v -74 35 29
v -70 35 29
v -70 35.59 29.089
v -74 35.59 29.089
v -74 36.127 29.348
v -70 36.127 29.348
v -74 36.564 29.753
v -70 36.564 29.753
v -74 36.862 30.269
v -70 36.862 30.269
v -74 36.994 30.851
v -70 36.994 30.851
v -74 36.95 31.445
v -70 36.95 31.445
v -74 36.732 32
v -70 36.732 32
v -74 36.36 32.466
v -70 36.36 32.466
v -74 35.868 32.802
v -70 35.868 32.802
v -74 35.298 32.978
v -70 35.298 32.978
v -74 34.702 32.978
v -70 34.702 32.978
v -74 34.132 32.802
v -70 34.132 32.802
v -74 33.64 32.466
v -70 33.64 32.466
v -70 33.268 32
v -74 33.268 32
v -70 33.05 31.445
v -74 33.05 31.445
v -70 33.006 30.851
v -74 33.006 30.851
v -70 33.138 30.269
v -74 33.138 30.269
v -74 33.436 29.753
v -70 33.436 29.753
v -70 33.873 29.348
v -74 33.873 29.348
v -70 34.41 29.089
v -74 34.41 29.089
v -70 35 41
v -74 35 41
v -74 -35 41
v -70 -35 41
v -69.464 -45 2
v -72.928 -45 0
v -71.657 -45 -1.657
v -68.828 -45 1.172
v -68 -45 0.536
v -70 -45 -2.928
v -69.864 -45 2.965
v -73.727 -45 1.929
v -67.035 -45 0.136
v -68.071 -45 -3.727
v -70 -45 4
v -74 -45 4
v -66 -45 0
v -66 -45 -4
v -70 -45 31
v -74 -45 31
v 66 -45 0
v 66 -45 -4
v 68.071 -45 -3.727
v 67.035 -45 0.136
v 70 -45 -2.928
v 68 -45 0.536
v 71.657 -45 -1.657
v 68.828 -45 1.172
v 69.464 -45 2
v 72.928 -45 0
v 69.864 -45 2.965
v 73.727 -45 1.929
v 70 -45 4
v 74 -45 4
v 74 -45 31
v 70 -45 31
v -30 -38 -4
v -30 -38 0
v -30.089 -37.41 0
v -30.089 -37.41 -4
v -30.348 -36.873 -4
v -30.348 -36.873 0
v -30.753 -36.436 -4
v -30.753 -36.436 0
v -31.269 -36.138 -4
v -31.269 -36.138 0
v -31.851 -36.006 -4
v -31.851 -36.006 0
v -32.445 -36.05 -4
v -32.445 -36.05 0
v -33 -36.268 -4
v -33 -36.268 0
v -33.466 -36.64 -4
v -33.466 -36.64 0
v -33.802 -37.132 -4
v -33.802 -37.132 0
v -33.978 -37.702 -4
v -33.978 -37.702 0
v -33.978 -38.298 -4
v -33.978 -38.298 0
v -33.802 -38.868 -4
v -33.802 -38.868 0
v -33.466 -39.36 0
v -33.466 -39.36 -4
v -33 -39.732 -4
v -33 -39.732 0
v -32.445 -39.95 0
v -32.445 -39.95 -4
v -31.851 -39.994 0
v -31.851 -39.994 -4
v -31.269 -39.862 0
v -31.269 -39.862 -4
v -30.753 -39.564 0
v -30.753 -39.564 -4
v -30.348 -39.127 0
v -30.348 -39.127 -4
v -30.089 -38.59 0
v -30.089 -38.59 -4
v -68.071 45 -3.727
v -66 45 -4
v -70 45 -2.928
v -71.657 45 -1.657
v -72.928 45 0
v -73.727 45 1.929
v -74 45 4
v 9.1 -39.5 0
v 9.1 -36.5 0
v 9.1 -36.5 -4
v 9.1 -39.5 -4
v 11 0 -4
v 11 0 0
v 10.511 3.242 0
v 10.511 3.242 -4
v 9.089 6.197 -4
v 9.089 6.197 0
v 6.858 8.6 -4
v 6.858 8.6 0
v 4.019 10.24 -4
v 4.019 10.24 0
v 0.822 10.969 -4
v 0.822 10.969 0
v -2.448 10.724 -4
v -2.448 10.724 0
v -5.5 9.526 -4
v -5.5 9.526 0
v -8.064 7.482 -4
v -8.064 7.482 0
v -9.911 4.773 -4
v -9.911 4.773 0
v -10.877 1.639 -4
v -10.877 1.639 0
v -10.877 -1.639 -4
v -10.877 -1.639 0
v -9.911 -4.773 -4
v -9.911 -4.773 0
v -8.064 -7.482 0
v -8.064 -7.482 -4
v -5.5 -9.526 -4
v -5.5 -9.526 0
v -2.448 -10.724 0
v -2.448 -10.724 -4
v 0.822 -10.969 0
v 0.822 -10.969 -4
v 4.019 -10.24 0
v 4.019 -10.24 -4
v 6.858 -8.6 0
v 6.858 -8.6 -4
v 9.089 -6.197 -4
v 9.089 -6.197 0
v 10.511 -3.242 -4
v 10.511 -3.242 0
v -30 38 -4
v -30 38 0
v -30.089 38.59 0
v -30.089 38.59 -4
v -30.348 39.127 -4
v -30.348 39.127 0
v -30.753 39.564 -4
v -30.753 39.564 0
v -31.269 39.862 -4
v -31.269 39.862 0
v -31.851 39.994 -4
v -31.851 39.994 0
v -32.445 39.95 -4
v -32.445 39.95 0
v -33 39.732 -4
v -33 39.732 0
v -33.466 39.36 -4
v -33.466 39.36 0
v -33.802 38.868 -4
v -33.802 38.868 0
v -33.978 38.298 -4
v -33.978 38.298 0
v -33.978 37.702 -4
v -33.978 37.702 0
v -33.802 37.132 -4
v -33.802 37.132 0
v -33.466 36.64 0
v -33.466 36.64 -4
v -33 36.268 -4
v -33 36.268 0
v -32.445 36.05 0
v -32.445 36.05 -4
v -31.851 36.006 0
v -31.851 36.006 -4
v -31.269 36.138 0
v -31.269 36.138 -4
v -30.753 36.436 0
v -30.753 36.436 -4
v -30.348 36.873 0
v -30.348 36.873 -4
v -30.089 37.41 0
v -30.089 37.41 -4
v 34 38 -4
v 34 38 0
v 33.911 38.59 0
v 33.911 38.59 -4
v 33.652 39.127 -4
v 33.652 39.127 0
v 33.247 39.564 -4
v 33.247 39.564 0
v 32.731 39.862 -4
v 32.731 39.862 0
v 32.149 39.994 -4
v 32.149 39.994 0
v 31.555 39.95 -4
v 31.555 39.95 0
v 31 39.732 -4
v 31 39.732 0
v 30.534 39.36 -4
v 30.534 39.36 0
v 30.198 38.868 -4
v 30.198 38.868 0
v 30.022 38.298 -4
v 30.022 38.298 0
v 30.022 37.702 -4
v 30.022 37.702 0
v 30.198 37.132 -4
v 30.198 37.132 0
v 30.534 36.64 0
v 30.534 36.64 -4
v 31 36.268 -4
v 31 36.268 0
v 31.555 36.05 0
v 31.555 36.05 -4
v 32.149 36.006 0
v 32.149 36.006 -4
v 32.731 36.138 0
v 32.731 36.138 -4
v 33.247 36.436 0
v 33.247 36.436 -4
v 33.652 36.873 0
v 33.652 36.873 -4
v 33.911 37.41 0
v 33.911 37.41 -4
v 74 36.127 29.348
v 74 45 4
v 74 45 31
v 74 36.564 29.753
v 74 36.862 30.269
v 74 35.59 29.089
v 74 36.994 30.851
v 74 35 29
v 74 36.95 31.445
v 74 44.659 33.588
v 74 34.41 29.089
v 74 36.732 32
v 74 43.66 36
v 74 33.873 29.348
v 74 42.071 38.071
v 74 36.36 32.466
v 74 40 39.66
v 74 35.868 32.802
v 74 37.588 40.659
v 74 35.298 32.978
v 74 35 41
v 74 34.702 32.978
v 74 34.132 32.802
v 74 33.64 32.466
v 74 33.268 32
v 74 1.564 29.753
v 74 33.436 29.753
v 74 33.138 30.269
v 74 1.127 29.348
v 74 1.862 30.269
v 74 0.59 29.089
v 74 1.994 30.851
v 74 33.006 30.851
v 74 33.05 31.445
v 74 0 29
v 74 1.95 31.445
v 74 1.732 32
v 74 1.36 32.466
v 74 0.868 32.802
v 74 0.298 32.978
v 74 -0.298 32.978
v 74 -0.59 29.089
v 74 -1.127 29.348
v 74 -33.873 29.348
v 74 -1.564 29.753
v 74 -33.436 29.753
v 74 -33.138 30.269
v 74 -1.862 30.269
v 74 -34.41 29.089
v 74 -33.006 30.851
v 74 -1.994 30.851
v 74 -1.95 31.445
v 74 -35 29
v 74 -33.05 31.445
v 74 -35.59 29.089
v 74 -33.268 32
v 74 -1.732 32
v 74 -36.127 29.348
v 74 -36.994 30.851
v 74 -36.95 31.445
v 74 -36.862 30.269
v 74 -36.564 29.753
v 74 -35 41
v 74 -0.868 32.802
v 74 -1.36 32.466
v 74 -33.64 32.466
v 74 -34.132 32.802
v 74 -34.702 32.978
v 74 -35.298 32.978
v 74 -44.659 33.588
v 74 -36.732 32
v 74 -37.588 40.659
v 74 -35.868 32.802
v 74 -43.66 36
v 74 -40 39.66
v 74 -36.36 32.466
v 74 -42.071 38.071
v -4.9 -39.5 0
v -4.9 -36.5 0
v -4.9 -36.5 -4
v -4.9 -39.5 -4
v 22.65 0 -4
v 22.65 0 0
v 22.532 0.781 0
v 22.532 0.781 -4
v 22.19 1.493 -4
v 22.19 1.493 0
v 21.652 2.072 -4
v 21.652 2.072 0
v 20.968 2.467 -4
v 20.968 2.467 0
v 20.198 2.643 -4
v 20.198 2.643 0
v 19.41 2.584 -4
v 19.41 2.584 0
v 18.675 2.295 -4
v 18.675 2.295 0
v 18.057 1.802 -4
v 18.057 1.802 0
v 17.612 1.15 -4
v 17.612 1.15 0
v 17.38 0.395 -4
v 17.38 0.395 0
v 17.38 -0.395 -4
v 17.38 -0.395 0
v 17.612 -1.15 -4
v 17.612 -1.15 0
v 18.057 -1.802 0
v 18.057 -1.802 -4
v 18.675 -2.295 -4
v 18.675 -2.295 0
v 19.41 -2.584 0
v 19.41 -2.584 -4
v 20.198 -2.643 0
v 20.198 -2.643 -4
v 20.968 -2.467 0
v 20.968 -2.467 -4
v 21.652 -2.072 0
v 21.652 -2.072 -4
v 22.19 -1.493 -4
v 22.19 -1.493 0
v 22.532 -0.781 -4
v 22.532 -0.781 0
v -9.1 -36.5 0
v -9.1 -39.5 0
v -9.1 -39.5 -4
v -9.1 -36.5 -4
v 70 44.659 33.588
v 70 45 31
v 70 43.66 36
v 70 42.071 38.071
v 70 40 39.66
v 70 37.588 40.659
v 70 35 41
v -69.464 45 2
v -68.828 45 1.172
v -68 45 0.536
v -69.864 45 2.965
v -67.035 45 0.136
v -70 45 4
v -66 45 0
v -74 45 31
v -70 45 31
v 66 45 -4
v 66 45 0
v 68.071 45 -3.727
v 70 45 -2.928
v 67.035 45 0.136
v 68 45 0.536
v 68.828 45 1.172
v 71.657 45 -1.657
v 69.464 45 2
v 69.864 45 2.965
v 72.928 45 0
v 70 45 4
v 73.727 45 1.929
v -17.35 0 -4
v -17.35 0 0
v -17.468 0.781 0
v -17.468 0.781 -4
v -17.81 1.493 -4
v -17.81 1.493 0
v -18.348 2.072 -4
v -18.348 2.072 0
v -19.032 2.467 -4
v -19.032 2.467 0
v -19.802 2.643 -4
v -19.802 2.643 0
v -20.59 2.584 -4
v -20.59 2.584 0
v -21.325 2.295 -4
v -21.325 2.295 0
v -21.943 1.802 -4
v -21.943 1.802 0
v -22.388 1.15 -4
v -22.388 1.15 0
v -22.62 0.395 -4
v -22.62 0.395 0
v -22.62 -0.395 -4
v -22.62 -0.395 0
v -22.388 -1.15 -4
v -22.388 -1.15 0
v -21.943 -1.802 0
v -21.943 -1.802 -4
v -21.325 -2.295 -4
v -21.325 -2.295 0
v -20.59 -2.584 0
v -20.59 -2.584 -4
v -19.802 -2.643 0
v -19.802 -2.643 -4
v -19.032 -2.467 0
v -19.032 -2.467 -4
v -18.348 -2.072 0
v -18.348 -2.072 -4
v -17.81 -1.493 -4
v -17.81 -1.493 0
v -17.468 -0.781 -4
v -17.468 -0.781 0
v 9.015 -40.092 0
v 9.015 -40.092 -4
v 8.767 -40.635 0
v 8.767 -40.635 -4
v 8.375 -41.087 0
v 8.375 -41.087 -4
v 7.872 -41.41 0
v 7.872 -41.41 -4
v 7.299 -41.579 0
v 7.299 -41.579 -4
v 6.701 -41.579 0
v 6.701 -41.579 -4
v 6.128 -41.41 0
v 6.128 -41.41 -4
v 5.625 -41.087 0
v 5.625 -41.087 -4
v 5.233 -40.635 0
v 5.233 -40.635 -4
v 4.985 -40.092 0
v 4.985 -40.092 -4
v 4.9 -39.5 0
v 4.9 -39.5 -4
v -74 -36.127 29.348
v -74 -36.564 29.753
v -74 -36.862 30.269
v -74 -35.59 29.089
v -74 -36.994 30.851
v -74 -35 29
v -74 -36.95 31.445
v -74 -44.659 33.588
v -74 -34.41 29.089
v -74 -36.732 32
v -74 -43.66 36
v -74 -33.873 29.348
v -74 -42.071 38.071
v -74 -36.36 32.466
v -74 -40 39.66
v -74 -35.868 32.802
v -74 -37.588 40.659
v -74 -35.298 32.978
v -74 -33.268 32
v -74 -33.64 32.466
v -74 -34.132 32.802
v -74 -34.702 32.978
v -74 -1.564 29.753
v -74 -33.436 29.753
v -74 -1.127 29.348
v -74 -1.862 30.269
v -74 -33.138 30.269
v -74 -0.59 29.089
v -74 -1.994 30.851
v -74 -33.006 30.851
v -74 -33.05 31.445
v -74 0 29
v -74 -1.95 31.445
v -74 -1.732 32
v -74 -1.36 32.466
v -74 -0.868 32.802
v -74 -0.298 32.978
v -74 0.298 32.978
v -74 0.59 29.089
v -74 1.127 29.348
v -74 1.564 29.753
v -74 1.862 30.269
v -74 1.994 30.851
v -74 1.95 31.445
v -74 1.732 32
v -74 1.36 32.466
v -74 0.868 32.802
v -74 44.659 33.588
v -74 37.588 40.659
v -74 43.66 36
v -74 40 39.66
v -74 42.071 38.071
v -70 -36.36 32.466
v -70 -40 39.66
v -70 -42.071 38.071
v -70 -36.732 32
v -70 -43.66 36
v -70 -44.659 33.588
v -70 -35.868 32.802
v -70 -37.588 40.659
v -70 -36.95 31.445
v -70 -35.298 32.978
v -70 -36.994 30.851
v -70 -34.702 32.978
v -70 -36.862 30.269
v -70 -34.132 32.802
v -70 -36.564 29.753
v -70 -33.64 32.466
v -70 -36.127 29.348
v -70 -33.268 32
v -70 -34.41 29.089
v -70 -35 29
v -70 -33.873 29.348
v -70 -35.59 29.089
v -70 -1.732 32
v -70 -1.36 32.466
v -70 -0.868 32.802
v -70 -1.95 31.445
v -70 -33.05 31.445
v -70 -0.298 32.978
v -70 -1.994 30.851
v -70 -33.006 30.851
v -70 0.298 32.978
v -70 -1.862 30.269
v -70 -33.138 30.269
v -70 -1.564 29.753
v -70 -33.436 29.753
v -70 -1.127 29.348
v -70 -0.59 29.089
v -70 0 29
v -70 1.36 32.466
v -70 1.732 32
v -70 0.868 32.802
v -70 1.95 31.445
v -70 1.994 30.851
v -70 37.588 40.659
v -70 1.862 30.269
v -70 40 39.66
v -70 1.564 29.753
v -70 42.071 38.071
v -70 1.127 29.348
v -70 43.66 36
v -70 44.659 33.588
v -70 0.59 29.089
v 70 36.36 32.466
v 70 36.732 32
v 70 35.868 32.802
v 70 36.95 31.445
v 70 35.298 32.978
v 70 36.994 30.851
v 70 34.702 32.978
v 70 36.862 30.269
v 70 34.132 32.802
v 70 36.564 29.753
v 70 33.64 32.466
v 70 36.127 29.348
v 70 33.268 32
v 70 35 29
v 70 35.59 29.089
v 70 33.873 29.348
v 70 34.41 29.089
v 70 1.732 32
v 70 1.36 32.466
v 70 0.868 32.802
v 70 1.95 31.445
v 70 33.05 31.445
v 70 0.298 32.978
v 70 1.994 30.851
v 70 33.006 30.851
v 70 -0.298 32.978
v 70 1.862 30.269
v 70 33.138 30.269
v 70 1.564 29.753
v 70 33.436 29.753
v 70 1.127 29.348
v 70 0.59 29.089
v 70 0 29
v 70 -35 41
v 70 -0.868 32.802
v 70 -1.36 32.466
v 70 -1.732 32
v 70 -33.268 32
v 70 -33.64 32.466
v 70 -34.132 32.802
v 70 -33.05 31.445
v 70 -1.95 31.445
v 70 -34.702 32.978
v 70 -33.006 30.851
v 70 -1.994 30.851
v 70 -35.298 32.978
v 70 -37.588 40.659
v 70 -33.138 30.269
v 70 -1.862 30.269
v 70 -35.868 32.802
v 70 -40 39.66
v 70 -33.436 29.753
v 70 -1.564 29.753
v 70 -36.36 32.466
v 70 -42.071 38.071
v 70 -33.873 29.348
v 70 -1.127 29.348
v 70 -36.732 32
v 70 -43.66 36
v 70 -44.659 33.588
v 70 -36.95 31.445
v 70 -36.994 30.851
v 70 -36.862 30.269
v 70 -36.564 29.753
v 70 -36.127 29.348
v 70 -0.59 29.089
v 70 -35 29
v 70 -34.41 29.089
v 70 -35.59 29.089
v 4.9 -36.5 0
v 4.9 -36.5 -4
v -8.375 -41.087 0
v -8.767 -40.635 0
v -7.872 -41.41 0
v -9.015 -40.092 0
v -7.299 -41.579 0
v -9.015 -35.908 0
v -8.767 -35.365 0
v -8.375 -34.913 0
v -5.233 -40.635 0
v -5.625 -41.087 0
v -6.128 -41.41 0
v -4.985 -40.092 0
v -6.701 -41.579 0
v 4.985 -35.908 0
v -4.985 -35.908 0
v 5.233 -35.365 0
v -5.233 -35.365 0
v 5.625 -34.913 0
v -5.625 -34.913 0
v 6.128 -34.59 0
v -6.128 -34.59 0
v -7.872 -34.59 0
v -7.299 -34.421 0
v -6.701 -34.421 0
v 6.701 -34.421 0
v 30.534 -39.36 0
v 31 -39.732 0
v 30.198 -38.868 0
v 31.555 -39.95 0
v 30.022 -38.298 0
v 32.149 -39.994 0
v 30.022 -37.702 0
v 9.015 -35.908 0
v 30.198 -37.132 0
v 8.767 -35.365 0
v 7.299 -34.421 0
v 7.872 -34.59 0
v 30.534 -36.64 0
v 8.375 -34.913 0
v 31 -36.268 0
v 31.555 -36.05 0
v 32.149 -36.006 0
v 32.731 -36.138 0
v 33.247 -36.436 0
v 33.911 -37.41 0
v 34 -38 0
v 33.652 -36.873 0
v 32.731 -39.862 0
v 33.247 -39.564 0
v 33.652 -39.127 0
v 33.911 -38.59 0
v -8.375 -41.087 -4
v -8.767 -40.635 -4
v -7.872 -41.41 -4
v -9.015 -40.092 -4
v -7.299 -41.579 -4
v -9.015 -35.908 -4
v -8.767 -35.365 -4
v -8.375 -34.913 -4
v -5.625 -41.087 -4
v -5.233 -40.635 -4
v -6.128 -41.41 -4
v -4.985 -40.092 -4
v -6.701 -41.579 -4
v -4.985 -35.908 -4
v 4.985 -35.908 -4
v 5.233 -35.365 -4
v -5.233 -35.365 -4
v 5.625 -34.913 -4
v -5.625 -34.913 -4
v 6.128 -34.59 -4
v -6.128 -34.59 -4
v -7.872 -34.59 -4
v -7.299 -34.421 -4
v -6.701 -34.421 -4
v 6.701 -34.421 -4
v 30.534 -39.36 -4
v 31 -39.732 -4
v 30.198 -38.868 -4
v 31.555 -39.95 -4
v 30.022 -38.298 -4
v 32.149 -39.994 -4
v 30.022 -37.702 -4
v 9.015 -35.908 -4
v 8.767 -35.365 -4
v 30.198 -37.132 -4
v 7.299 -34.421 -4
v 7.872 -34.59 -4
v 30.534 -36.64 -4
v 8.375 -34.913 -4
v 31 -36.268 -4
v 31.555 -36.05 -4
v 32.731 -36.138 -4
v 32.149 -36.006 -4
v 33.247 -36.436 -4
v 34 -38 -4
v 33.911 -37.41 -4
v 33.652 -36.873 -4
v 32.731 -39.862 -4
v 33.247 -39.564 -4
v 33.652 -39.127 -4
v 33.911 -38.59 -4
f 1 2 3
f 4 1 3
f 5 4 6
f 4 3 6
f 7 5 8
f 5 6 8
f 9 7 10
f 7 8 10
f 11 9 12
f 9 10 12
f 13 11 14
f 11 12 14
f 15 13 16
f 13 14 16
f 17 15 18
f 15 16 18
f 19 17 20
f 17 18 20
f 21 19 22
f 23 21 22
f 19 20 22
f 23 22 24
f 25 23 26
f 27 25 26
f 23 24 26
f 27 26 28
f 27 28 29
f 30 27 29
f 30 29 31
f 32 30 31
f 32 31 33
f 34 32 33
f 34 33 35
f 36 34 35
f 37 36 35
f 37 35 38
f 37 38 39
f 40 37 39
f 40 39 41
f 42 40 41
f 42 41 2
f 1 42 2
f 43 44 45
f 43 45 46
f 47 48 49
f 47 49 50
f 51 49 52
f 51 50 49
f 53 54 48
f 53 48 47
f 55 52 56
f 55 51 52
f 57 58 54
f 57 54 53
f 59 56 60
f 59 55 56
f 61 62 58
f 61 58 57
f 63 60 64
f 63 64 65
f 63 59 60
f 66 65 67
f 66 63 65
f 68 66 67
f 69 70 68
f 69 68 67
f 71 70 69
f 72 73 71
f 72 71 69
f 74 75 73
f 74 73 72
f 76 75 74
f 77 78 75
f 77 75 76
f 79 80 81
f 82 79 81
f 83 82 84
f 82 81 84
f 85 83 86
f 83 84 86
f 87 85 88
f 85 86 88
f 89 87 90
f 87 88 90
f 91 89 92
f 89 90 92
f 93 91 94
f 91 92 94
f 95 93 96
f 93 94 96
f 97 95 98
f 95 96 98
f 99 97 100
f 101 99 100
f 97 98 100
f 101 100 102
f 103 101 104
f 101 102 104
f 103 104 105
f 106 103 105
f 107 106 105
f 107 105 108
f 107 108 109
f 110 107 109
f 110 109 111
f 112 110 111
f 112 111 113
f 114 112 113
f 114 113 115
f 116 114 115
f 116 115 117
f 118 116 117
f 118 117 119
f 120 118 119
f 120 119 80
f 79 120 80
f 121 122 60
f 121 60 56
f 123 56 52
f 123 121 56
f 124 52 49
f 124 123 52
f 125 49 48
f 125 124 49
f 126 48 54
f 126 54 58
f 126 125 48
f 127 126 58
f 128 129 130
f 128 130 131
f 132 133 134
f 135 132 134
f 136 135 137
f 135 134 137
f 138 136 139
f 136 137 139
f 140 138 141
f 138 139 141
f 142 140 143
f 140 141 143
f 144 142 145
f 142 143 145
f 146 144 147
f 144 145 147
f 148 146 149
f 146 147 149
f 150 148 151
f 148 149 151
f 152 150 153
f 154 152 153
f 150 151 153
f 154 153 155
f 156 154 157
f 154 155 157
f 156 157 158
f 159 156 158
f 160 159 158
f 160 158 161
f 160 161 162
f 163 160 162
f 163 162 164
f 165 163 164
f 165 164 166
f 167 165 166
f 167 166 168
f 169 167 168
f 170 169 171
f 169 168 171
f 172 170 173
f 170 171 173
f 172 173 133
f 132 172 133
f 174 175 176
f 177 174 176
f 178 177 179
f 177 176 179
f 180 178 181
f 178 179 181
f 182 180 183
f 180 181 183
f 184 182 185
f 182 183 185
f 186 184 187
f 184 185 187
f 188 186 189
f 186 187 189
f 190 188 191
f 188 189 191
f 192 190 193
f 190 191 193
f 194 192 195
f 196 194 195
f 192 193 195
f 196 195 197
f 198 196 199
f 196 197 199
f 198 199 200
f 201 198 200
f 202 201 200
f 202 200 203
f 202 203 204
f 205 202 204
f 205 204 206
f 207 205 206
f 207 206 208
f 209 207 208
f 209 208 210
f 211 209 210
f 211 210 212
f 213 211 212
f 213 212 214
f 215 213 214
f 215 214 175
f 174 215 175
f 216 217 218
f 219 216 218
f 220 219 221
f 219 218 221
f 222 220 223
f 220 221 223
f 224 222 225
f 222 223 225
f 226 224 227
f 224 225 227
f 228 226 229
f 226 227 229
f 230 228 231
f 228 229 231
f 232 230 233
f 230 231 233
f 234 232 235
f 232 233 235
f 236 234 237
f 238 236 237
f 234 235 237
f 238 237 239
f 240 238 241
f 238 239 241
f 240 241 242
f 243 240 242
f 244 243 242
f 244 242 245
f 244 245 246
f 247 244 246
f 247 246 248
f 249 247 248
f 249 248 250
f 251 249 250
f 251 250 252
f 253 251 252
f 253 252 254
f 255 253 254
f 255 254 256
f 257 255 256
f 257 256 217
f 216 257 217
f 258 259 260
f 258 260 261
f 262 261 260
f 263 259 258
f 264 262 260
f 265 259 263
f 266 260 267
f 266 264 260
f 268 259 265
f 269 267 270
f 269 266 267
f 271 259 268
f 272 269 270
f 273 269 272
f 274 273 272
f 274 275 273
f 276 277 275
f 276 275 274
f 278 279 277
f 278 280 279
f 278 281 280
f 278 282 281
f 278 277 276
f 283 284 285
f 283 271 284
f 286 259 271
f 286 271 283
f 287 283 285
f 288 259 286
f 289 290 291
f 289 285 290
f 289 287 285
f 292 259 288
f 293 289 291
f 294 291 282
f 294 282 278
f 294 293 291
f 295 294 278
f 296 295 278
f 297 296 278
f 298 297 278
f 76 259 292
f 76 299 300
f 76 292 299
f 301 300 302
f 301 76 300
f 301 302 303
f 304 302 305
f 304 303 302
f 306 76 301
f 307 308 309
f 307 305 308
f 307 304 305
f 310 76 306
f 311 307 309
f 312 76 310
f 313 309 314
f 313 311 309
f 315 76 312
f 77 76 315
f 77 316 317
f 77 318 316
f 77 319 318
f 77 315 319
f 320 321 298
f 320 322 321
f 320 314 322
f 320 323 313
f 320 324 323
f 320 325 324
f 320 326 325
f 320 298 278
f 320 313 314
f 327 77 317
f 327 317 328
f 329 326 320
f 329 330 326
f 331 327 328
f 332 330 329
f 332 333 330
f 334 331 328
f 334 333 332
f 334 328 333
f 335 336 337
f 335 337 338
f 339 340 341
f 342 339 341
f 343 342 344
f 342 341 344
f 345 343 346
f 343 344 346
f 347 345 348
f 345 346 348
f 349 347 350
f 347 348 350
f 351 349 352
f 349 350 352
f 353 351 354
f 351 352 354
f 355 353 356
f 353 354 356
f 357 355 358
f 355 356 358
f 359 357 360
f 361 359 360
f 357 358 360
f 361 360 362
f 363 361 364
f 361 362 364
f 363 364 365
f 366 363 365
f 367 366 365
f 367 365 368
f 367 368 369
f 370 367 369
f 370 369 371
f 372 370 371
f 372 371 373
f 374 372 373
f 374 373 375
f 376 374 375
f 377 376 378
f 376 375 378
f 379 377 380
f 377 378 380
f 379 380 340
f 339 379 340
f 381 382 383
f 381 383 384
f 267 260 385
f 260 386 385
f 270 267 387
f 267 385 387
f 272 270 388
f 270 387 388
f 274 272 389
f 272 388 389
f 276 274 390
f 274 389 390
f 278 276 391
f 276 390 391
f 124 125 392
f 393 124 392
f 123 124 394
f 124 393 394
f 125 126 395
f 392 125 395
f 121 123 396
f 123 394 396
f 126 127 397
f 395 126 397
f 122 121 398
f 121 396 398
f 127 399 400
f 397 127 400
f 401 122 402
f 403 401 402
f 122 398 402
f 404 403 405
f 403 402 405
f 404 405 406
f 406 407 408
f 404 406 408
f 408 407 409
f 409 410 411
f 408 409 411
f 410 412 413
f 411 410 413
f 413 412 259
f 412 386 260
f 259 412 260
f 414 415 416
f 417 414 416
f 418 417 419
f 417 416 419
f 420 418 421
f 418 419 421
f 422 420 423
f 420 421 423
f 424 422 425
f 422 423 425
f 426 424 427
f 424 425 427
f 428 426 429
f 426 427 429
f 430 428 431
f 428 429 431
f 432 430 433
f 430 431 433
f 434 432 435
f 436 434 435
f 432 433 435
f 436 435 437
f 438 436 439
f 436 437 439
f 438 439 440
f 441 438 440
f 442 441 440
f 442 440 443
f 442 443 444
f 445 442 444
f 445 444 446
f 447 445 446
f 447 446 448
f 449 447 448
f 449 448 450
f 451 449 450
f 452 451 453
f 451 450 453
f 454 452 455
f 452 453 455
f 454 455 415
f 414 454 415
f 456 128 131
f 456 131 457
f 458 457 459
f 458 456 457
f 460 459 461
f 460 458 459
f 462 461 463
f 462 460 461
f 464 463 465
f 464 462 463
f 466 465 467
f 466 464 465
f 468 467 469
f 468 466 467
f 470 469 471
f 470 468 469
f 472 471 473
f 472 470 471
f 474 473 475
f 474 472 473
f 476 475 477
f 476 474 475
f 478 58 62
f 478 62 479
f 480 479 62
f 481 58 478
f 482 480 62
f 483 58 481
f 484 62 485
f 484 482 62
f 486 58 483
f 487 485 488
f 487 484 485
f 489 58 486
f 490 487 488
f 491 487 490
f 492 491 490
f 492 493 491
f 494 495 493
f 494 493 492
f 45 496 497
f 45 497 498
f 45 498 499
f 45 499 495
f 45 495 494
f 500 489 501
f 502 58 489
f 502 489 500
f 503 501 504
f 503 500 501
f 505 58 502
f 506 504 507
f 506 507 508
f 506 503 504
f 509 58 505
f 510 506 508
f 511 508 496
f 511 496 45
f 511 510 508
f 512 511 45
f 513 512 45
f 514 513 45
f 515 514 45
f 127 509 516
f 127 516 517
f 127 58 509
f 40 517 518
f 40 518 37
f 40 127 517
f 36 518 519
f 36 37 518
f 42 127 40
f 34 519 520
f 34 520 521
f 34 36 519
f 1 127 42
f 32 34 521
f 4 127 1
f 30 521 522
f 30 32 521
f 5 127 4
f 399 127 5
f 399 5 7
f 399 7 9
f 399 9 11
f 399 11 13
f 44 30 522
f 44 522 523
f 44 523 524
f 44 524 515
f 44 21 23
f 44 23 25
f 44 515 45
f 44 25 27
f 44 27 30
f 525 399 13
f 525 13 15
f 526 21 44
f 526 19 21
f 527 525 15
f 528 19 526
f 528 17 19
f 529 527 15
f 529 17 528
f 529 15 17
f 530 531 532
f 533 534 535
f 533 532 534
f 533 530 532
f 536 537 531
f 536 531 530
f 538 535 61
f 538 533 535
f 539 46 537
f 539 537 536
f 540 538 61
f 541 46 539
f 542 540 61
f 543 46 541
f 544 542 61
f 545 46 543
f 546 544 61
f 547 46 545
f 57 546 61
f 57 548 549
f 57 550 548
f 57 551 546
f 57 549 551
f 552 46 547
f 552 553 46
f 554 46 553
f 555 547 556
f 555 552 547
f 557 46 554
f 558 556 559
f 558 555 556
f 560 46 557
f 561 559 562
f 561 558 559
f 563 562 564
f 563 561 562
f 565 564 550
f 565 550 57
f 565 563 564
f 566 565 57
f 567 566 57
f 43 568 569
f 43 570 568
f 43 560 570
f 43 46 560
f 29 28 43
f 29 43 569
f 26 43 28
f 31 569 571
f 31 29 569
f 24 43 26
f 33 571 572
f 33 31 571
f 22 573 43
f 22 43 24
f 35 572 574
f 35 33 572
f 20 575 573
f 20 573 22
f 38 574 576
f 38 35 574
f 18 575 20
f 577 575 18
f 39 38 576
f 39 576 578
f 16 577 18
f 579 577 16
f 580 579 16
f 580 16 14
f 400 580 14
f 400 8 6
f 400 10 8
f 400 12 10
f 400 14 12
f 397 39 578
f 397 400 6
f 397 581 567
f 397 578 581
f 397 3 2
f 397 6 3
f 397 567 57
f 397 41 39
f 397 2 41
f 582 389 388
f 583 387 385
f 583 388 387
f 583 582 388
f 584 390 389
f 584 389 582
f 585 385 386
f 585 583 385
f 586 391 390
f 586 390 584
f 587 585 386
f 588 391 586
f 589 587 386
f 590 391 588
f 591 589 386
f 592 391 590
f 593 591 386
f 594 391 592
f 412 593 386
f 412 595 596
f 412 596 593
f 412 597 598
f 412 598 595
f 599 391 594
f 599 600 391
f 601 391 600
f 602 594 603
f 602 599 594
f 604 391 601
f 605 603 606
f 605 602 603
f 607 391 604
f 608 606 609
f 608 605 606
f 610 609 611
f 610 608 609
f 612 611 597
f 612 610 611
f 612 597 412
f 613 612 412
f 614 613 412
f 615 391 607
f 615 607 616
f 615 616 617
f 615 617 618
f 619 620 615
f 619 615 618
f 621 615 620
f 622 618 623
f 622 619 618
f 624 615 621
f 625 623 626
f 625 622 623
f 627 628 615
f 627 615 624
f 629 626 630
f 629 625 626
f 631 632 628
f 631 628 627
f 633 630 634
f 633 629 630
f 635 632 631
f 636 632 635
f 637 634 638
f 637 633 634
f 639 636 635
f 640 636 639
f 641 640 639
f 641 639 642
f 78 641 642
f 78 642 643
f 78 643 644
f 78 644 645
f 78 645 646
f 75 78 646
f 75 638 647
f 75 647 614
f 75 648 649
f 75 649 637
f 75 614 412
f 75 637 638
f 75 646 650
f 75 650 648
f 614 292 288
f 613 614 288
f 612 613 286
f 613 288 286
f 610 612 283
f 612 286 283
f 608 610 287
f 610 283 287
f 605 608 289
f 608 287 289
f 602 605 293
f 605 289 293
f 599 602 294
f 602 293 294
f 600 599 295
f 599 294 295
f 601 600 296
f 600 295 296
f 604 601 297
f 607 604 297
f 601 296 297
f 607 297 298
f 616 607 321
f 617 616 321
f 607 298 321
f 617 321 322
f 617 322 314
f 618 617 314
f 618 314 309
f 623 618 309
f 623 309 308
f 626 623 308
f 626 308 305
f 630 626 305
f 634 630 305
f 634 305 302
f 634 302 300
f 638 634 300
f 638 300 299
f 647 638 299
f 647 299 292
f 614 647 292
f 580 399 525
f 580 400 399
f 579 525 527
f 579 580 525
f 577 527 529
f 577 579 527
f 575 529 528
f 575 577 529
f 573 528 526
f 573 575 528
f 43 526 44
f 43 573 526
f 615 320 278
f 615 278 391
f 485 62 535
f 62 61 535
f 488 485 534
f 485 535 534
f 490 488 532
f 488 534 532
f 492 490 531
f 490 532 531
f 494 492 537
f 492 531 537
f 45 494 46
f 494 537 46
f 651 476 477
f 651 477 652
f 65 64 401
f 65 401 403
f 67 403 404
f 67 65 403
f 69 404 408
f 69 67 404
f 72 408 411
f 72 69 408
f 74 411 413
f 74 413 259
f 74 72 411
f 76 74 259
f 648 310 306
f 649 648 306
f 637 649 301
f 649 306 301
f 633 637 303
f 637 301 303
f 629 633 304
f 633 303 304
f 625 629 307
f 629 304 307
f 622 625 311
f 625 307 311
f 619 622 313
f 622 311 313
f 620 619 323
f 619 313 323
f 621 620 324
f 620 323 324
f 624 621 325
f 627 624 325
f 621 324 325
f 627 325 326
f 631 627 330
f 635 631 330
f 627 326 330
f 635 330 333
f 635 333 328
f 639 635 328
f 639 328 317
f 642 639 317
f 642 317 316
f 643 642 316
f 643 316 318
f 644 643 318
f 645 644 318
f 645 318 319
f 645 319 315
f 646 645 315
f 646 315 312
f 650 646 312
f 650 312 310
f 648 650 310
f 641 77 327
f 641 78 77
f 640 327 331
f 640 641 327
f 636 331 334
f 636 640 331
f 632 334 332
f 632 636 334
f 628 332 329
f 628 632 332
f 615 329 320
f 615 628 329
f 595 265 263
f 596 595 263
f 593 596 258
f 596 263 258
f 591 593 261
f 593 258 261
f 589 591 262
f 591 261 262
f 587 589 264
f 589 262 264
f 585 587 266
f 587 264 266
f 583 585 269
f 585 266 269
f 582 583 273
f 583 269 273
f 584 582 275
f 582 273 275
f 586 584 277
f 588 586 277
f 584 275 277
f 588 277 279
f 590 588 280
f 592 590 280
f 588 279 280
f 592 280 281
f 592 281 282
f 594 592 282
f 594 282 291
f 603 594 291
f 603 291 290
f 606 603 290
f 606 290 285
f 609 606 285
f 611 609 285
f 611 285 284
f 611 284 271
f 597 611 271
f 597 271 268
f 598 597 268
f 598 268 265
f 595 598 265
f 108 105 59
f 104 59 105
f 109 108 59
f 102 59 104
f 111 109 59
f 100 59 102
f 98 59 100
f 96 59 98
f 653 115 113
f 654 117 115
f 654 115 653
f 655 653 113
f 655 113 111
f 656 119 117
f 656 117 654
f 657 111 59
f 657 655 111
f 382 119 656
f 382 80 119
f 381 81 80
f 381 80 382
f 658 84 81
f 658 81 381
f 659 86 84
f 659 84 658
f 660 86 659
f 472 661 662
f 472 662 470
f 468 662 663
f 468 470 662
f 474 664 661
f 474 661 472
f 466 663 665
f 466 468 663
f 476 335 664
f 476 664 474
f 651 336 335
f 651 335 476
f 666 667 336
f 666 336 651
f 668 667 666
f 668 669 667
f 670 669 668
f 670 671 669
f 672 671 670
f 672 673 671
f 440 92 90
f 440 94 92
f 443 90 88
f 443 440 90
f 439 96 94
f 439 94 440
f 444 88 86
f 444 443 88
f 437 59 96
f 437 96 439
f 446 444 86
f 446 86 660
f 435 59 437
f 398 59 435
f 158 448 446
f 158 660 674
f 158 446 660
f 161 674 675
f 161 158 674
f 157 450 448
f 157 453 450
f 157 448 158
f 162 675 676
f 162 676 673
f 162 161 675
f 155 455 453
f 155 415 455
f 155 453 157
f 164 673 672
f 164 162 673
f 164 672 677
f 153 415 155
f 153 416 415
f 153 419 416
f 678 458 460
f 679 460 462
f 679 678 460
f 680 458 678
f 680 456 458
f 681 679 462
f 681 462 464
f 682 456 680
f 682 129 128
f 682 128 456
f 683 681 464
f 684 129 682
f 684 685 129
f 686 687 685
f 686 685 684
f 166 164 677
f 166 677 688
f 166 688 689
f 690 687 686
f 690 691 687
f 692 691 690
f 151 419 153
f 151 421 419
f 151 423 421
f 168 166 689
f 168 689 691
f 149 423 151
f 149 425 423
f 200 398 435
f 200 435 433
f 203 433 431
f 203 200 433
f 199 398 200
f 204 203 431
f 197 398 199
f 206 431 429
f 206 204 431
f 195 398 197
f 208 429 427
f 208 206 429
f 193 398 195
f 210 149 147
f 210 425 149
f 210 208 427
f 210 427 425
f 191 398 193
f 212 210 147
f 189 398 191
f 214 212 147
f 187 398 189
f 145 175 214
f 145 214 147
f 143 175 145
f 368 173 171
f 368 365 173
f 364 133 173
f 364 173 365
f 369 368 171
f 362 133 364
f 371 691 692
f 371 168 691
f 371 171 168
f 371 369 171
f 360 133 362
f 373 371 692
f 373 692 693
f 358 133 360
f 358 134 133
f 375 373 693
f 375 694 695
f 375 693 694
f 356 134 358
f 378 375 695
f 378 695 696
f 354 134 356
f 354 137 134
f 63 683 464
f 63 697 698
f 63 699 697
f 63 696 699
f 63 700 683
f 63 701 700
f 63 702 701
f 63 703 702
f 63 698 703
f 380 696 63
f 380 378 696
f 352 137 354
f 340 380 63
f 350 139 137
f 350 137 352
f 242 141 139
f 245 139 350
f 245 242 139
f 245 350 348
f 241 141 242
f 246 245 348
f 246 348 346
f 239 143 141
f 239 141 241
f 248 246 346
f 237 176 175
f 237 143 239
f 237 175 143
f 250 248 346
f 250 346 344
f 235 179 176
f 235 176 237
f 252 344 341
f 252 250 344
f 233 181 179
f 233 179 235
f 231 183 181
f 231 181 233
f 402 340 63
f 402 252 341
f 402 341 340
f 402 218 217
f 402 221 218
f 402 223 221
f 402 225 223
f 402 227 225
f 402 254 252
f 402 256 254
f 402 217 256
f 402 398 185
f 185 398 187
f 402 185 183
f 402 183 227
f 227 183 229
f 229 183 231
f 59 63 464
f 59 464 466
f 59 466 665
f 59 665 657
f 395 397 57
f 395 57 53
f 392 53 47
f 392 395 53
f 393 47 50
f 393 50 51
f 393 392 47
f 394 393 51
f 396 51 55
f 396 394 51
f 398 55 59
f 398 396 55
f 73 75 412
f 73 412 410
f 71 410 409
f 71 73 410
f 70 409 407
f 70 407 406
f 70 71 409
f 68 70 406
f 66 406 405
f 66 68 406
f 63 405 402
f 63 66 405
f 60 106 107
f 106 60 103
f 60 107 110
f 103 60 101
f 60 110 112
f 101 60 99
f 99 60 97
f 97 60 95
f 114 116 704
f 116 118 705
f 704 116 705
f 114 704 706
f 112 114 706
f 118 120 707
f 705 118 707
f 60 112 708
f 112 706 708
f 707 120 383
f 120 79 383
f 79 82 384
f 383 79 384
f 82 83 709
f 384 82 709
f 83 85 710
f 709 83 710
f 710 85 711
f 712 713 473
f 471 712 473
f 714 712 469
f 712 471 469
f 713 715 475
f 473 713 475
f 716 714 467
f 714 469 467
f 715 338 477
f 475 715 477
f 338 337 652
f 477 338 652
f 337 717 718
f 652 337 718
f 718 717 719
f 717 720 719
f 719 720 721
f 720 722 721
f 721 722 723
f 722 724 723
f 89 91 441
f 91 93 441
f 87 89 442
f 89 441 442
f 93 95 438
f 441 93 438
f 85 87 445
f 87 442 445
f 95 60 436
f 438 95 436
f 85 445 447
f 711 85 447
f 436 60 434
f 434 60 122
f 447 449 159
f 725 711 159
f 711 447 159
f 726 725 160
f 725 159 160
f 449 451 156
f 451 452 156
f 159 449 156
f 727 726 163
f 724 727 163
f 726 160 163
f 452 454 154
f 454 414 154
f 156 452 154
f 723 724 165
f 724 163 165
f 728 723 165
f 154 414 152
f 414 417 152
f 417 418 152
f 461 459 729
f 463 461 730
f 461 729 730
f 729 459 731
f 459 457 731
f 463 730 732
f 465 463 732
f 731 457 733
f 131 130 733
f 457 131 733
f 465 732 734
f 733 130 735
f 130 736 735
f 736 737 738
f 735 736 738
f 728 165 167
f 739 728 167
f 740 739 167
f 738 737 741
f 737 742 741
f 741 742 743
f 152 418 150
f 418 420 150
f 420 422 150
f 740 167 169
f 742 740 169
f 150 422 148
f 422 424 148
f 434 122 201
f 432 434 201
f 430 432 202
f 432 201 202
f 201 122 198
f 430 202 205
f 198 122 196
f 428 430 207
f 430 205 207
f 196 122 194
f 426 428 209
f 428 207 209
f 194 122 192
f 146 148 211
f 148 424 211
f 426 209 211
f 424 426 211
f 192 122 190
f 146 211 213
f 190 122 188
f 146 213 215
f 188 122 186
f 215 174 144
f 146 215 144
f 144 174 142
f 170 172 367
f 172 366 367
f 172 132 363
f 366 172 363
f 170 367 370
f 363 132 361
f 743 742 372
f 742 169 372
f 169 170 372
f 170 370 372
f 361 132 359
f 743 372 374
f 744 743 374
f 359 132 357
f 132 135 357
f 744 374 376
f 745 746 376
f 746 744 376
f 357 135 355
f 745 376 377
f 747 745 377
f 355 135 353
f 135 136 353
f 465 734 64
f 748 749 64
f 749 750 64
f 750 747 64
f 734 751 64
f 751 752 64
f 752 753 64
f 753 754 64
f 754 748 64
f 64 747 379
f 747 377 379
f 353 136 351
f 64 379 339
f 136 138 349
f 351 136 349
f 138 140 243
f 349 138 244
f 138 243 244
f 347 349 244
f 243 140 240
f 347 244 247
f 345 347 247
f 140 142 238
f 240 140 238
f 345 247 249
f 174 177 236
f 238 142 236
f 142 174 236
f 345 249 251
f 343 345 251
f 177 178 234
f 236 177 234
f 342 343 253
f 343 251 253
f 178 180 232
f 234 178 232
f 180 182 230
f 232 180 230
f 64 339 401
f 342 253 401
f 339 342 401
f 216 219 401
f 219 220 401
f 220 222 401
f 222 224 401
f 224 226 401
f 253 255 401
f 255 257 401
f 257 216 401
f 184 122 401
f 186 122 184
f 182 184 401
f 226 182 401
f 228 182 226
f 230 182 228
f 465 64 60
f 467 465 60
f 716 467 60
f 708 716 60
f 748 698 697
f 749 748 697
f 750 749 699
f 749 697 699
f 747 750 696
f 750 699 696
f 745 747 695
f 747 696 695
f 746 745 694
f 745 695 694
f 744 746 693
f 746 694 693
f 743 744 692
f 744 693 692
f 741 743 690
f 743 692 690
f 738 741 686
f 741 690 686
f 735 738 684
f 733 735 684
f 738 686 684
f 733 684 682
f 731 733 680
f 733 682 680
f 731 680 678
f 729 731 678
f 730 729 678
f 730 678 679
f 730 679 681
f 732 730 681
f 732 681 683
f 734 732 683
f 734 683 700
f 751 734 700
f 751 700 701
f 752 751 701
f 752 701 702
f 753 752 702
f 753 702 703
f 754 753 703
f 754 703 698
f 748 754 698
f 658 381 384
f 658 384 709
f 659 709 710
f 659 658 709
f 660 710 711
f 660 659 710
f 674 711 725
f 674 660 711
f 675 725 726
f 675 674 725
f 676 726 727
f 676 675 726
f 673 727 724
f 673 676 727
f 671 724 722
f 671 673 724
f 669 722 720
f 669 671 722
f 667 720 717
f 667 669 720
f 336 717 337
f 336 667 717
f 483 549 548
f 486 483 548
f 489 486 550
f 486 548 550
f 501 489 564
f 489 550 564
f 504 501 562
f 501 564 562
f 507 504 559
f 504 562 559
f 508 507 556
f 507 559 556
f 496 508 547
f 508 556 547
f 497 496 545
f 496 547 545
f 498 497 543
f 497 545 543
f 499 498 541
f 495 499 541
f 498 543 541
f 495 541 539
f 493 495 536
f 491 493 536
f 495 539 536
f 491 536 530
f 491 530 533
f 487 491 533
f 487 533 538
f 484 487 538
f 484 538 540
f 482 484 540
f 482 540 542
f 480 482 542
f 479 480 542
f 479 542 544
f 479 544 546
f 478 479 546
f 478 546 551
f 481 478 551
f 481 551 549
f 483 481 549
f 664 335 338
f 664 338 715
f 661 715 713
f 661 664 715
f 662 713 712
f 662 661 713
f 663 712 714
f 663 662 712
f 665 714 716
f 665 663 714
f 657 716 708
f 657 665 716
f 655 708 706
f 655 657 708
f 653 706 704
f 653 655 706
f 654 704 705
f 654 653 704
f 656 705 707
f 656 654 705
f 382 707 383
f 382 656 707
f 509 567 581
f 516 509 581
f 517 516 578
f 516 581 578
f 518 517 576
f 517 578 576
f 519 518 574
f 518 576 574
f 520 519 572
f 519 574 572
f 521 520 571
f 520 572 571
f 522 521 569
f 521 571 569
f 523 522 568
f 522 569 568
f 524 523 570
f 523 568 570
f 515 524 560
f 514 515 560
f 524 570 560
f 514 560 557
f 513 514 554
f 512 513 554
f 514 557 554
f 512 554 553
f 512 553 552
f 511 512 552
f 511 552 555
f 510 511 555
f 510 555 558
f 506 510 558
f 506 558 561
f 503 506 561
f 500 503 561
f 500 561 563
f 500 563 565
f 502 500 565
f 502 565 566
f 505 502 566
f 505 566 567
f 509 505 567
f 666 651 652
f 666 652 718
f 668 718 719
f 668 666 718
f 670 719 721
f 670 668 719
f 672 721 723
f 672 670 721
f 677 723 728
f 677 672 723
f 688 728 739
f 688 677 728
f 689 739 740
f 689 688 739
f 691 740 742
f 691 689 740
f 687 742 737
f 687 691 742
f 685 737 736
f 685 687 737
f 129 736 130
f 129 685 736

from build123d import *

# Parameters (mm, degrees)
SKETCH_1_W                         = 148
SKETCH_1_H                         = 90
SKETCH_1_R                         = 11
SKETCH_1_R_2                       = 2.65
SM_BASE_FLANGE_1_DEPTH             = 4
SM_EDGE_FLANGE_1_STRIP_W           = 24
SM_EDGE_FLANGE_1_STRIP_H           = 4
SM_EDGE_FLANGE_1_STRIP_CUT_DEPTH   = 90
SM_EDGE_FLANGE_1_STRIP_2_W         = 24
SM_EDGE_FLANGE_1_STRIP_2_H         = 4
SM_EDGE_FLANGE_1_STRIP_CUT_2_DEPTH = 90
SM_EDGE_FLANGE_1_DEPTH             = 90
SM_EDGE_FLANGE_1_BEND_DEPTH        = 90
SKETCH_12_R                        = 2
CUT_EXTRUDE_1_DEPTH                = 161.031246949
FILLET_1_R                         = 10
SKETCH_13_R                        = 2
CUT_EXTRUDE_2_DEPTH                = 96.822753039


# Sheet-metal steps are written as plain solids
with BuildPart() as part:
    # Sketch 1 → Базовая кромка1 (new body)
    with BuildSketch(Plane.XY):
        Rectangle(SKETCH_1_W, SKETCH_1_H)
        Circle(SKETCH_1_R, mode=Mode.SUBTRACT)
        with Locations((20, 0)):
            Circle(SKETCH_1_R_2, mode=Mode.SUBTRACT)
        with Locations((-20, 0)):
            Circle(SKETCH_1_R_2, mode=Mode.SUBTRACT)
        with BuildLine():
            Line((-4.9, -36.5), (-4.9, -39.5))
            ThreePointArc((-4.9, -39.5), (-7, -41.6), (-9.1, -39.5))
            Line((-9.1, -39.5), (-9.1, -36.5))
            ThreePointArc((-9.1, -36.5), (-7, -34.4), (-4.9, -36.5))
        make_face(mode=Mode.SUBTRACT)
        with BuildLine():
            Line((9.1, -36.5), (9.1, -39.5))
            ThreePointArc((9.1, -39.5), (7, -41.6), (4.9, -39.5))
            Line((4.9, -39.5), (4.9, -36.5))
            ThreePointArc((4.9, -36.5), (7, -34.4), (9.1, -36.5))
        make_face(mode=Mode.SUBTRACT)
    extrude(amount=-SM_BASE_FLANGE_1_DEPTH)

    # Ребро-кромка1 strip (across the edge) → Ребро-кромка1 strip cut (cut)
    with BuildSketch(Plane(origin=(-74, 45, 0), x_dir=(1, 0, 0), z_dir=(0, -1, 0))):
        with Locations((-4, -2)):
            Rectangle(SM_EDGE_FLANGE_1_STRIP_W, SM_EDGE_FLANGE_1_STRIP_H)
    extrude(amount=SM_EDGE_FLANGE_1_STRIP_CUT_DEPTH, mode=Mode.SUBTRACT)

    # Ребро-кромка1 strip 2 (across the edge) → Ребро-кромка1 strip cut 2 (cut)
    with BuildSketch(Plane(origin=(74, -45, 0), x_dir=(-1, 0, 0), z_dir=(0, 1, 0))):
        with Locations((-4, -2)):
            Rectangle(SM_EDGE_FLANGE_1_STRIP_2_W, SM_EDGE_FLANGE_1_STRIP_2_H)
    extrude(amount=SM_EDGE_FLANGE_1_STRIP_CUT_2_DEPTH, mode=Mode.SUBTRACT)

    # Ребро-кромка1 section (across the edge) → Ребро-кромка1 (add)
    with BuildSketch(Plane(origin=(-74, 45, 0), x_dir=(1, 0, 0), z_dir=(0, -1, 0))):
        with BuildLine():
            Line((0, 4), (0, 41))
            Line((0, 41), (4, 41))
            Line((4, 41), (4, 4))
            ThreePointArc((4, 4), (5.171572875, 1.171572875), (8, 0))
            Line((8, 0), (8, -4))
            ThreePointArc((8, -4), (2.343145751, -1.656854249), (0, 4))
        make_face()
    extrude(amount=SM_EDGE_FLANGE_1_DEPTH)

    # Ребро-кромка1 section 2 (across the edge) → Ребро-кромка1 bend (add)
    with BuildSketch(Plane(origin=(74, -45, 0), x_dir=(-1, 0, 0), z_dir=(0, 1, 0))):
        with BuildLine():
            Line((0, 4), (0, 41))
            Line((0, 41), (4, 41))
            Line((4, 41), (4, 4))
            ThreePointArc((4, 4), (5.171572875, 1.171572875), (8, 0))
            Line((8, 0), (8, -4))
            ThreePointArc((8, -4), (2.343145751, -1.656854249), (0, 4))
        make_face()
    extrude(amount=SM_EDGE_FLANGE_1_BEND_DEPTH)

    # Эскиз12 → Вырез-Вытянуть1 (cut, through all)
    with BuildSketch(Plane(origin=(74, 0, 0), x_dir=(0, 0, -1), z_dir=(1, 0, 0))):
        with Locations((-31, 35)):
            Circle(SKETCH_12_R)
        with Locations((-31, -35)):
            Circle(SKETCH_12_R)
        with Locations((-31, 0)):
            Circle(SKETCH_12_R)
    extrude(amount=-CUT_EXTRUDE_1_DEPTH, mode=Mode.SUBTRACT)

    # Скругление1
    fillet_1_edges = [part.edges().sort_by_distance(p)[0] for p in [
        (72, -45, 41),
        (72, 45, 41),
        (-72, 45, 41),
        (-72, -45, 41),
    ]]
    fillet(fillet_1_edges, radius=FILLET_1_R)

    # Эскиз13 → Вырез-Вытянуть2 (cut, through all)
    with BuildSketch(Plane.XY):
        with Locations((-32, 38)):
            Circle(SKETCH_13_R)
        with Locations((32, 38)):
            Circle(SKETCH_13_R)
        with Locations((32, -38)):
            Circle(SKETCH_13_R)
        with Locations((-32, -38)):
            Circle(SKETCH_13_R)
    extrude(amount=-CUT_EXTRUDE_2_DEPTH, mode=Mode.SUBTRACT)


solid = part.part
